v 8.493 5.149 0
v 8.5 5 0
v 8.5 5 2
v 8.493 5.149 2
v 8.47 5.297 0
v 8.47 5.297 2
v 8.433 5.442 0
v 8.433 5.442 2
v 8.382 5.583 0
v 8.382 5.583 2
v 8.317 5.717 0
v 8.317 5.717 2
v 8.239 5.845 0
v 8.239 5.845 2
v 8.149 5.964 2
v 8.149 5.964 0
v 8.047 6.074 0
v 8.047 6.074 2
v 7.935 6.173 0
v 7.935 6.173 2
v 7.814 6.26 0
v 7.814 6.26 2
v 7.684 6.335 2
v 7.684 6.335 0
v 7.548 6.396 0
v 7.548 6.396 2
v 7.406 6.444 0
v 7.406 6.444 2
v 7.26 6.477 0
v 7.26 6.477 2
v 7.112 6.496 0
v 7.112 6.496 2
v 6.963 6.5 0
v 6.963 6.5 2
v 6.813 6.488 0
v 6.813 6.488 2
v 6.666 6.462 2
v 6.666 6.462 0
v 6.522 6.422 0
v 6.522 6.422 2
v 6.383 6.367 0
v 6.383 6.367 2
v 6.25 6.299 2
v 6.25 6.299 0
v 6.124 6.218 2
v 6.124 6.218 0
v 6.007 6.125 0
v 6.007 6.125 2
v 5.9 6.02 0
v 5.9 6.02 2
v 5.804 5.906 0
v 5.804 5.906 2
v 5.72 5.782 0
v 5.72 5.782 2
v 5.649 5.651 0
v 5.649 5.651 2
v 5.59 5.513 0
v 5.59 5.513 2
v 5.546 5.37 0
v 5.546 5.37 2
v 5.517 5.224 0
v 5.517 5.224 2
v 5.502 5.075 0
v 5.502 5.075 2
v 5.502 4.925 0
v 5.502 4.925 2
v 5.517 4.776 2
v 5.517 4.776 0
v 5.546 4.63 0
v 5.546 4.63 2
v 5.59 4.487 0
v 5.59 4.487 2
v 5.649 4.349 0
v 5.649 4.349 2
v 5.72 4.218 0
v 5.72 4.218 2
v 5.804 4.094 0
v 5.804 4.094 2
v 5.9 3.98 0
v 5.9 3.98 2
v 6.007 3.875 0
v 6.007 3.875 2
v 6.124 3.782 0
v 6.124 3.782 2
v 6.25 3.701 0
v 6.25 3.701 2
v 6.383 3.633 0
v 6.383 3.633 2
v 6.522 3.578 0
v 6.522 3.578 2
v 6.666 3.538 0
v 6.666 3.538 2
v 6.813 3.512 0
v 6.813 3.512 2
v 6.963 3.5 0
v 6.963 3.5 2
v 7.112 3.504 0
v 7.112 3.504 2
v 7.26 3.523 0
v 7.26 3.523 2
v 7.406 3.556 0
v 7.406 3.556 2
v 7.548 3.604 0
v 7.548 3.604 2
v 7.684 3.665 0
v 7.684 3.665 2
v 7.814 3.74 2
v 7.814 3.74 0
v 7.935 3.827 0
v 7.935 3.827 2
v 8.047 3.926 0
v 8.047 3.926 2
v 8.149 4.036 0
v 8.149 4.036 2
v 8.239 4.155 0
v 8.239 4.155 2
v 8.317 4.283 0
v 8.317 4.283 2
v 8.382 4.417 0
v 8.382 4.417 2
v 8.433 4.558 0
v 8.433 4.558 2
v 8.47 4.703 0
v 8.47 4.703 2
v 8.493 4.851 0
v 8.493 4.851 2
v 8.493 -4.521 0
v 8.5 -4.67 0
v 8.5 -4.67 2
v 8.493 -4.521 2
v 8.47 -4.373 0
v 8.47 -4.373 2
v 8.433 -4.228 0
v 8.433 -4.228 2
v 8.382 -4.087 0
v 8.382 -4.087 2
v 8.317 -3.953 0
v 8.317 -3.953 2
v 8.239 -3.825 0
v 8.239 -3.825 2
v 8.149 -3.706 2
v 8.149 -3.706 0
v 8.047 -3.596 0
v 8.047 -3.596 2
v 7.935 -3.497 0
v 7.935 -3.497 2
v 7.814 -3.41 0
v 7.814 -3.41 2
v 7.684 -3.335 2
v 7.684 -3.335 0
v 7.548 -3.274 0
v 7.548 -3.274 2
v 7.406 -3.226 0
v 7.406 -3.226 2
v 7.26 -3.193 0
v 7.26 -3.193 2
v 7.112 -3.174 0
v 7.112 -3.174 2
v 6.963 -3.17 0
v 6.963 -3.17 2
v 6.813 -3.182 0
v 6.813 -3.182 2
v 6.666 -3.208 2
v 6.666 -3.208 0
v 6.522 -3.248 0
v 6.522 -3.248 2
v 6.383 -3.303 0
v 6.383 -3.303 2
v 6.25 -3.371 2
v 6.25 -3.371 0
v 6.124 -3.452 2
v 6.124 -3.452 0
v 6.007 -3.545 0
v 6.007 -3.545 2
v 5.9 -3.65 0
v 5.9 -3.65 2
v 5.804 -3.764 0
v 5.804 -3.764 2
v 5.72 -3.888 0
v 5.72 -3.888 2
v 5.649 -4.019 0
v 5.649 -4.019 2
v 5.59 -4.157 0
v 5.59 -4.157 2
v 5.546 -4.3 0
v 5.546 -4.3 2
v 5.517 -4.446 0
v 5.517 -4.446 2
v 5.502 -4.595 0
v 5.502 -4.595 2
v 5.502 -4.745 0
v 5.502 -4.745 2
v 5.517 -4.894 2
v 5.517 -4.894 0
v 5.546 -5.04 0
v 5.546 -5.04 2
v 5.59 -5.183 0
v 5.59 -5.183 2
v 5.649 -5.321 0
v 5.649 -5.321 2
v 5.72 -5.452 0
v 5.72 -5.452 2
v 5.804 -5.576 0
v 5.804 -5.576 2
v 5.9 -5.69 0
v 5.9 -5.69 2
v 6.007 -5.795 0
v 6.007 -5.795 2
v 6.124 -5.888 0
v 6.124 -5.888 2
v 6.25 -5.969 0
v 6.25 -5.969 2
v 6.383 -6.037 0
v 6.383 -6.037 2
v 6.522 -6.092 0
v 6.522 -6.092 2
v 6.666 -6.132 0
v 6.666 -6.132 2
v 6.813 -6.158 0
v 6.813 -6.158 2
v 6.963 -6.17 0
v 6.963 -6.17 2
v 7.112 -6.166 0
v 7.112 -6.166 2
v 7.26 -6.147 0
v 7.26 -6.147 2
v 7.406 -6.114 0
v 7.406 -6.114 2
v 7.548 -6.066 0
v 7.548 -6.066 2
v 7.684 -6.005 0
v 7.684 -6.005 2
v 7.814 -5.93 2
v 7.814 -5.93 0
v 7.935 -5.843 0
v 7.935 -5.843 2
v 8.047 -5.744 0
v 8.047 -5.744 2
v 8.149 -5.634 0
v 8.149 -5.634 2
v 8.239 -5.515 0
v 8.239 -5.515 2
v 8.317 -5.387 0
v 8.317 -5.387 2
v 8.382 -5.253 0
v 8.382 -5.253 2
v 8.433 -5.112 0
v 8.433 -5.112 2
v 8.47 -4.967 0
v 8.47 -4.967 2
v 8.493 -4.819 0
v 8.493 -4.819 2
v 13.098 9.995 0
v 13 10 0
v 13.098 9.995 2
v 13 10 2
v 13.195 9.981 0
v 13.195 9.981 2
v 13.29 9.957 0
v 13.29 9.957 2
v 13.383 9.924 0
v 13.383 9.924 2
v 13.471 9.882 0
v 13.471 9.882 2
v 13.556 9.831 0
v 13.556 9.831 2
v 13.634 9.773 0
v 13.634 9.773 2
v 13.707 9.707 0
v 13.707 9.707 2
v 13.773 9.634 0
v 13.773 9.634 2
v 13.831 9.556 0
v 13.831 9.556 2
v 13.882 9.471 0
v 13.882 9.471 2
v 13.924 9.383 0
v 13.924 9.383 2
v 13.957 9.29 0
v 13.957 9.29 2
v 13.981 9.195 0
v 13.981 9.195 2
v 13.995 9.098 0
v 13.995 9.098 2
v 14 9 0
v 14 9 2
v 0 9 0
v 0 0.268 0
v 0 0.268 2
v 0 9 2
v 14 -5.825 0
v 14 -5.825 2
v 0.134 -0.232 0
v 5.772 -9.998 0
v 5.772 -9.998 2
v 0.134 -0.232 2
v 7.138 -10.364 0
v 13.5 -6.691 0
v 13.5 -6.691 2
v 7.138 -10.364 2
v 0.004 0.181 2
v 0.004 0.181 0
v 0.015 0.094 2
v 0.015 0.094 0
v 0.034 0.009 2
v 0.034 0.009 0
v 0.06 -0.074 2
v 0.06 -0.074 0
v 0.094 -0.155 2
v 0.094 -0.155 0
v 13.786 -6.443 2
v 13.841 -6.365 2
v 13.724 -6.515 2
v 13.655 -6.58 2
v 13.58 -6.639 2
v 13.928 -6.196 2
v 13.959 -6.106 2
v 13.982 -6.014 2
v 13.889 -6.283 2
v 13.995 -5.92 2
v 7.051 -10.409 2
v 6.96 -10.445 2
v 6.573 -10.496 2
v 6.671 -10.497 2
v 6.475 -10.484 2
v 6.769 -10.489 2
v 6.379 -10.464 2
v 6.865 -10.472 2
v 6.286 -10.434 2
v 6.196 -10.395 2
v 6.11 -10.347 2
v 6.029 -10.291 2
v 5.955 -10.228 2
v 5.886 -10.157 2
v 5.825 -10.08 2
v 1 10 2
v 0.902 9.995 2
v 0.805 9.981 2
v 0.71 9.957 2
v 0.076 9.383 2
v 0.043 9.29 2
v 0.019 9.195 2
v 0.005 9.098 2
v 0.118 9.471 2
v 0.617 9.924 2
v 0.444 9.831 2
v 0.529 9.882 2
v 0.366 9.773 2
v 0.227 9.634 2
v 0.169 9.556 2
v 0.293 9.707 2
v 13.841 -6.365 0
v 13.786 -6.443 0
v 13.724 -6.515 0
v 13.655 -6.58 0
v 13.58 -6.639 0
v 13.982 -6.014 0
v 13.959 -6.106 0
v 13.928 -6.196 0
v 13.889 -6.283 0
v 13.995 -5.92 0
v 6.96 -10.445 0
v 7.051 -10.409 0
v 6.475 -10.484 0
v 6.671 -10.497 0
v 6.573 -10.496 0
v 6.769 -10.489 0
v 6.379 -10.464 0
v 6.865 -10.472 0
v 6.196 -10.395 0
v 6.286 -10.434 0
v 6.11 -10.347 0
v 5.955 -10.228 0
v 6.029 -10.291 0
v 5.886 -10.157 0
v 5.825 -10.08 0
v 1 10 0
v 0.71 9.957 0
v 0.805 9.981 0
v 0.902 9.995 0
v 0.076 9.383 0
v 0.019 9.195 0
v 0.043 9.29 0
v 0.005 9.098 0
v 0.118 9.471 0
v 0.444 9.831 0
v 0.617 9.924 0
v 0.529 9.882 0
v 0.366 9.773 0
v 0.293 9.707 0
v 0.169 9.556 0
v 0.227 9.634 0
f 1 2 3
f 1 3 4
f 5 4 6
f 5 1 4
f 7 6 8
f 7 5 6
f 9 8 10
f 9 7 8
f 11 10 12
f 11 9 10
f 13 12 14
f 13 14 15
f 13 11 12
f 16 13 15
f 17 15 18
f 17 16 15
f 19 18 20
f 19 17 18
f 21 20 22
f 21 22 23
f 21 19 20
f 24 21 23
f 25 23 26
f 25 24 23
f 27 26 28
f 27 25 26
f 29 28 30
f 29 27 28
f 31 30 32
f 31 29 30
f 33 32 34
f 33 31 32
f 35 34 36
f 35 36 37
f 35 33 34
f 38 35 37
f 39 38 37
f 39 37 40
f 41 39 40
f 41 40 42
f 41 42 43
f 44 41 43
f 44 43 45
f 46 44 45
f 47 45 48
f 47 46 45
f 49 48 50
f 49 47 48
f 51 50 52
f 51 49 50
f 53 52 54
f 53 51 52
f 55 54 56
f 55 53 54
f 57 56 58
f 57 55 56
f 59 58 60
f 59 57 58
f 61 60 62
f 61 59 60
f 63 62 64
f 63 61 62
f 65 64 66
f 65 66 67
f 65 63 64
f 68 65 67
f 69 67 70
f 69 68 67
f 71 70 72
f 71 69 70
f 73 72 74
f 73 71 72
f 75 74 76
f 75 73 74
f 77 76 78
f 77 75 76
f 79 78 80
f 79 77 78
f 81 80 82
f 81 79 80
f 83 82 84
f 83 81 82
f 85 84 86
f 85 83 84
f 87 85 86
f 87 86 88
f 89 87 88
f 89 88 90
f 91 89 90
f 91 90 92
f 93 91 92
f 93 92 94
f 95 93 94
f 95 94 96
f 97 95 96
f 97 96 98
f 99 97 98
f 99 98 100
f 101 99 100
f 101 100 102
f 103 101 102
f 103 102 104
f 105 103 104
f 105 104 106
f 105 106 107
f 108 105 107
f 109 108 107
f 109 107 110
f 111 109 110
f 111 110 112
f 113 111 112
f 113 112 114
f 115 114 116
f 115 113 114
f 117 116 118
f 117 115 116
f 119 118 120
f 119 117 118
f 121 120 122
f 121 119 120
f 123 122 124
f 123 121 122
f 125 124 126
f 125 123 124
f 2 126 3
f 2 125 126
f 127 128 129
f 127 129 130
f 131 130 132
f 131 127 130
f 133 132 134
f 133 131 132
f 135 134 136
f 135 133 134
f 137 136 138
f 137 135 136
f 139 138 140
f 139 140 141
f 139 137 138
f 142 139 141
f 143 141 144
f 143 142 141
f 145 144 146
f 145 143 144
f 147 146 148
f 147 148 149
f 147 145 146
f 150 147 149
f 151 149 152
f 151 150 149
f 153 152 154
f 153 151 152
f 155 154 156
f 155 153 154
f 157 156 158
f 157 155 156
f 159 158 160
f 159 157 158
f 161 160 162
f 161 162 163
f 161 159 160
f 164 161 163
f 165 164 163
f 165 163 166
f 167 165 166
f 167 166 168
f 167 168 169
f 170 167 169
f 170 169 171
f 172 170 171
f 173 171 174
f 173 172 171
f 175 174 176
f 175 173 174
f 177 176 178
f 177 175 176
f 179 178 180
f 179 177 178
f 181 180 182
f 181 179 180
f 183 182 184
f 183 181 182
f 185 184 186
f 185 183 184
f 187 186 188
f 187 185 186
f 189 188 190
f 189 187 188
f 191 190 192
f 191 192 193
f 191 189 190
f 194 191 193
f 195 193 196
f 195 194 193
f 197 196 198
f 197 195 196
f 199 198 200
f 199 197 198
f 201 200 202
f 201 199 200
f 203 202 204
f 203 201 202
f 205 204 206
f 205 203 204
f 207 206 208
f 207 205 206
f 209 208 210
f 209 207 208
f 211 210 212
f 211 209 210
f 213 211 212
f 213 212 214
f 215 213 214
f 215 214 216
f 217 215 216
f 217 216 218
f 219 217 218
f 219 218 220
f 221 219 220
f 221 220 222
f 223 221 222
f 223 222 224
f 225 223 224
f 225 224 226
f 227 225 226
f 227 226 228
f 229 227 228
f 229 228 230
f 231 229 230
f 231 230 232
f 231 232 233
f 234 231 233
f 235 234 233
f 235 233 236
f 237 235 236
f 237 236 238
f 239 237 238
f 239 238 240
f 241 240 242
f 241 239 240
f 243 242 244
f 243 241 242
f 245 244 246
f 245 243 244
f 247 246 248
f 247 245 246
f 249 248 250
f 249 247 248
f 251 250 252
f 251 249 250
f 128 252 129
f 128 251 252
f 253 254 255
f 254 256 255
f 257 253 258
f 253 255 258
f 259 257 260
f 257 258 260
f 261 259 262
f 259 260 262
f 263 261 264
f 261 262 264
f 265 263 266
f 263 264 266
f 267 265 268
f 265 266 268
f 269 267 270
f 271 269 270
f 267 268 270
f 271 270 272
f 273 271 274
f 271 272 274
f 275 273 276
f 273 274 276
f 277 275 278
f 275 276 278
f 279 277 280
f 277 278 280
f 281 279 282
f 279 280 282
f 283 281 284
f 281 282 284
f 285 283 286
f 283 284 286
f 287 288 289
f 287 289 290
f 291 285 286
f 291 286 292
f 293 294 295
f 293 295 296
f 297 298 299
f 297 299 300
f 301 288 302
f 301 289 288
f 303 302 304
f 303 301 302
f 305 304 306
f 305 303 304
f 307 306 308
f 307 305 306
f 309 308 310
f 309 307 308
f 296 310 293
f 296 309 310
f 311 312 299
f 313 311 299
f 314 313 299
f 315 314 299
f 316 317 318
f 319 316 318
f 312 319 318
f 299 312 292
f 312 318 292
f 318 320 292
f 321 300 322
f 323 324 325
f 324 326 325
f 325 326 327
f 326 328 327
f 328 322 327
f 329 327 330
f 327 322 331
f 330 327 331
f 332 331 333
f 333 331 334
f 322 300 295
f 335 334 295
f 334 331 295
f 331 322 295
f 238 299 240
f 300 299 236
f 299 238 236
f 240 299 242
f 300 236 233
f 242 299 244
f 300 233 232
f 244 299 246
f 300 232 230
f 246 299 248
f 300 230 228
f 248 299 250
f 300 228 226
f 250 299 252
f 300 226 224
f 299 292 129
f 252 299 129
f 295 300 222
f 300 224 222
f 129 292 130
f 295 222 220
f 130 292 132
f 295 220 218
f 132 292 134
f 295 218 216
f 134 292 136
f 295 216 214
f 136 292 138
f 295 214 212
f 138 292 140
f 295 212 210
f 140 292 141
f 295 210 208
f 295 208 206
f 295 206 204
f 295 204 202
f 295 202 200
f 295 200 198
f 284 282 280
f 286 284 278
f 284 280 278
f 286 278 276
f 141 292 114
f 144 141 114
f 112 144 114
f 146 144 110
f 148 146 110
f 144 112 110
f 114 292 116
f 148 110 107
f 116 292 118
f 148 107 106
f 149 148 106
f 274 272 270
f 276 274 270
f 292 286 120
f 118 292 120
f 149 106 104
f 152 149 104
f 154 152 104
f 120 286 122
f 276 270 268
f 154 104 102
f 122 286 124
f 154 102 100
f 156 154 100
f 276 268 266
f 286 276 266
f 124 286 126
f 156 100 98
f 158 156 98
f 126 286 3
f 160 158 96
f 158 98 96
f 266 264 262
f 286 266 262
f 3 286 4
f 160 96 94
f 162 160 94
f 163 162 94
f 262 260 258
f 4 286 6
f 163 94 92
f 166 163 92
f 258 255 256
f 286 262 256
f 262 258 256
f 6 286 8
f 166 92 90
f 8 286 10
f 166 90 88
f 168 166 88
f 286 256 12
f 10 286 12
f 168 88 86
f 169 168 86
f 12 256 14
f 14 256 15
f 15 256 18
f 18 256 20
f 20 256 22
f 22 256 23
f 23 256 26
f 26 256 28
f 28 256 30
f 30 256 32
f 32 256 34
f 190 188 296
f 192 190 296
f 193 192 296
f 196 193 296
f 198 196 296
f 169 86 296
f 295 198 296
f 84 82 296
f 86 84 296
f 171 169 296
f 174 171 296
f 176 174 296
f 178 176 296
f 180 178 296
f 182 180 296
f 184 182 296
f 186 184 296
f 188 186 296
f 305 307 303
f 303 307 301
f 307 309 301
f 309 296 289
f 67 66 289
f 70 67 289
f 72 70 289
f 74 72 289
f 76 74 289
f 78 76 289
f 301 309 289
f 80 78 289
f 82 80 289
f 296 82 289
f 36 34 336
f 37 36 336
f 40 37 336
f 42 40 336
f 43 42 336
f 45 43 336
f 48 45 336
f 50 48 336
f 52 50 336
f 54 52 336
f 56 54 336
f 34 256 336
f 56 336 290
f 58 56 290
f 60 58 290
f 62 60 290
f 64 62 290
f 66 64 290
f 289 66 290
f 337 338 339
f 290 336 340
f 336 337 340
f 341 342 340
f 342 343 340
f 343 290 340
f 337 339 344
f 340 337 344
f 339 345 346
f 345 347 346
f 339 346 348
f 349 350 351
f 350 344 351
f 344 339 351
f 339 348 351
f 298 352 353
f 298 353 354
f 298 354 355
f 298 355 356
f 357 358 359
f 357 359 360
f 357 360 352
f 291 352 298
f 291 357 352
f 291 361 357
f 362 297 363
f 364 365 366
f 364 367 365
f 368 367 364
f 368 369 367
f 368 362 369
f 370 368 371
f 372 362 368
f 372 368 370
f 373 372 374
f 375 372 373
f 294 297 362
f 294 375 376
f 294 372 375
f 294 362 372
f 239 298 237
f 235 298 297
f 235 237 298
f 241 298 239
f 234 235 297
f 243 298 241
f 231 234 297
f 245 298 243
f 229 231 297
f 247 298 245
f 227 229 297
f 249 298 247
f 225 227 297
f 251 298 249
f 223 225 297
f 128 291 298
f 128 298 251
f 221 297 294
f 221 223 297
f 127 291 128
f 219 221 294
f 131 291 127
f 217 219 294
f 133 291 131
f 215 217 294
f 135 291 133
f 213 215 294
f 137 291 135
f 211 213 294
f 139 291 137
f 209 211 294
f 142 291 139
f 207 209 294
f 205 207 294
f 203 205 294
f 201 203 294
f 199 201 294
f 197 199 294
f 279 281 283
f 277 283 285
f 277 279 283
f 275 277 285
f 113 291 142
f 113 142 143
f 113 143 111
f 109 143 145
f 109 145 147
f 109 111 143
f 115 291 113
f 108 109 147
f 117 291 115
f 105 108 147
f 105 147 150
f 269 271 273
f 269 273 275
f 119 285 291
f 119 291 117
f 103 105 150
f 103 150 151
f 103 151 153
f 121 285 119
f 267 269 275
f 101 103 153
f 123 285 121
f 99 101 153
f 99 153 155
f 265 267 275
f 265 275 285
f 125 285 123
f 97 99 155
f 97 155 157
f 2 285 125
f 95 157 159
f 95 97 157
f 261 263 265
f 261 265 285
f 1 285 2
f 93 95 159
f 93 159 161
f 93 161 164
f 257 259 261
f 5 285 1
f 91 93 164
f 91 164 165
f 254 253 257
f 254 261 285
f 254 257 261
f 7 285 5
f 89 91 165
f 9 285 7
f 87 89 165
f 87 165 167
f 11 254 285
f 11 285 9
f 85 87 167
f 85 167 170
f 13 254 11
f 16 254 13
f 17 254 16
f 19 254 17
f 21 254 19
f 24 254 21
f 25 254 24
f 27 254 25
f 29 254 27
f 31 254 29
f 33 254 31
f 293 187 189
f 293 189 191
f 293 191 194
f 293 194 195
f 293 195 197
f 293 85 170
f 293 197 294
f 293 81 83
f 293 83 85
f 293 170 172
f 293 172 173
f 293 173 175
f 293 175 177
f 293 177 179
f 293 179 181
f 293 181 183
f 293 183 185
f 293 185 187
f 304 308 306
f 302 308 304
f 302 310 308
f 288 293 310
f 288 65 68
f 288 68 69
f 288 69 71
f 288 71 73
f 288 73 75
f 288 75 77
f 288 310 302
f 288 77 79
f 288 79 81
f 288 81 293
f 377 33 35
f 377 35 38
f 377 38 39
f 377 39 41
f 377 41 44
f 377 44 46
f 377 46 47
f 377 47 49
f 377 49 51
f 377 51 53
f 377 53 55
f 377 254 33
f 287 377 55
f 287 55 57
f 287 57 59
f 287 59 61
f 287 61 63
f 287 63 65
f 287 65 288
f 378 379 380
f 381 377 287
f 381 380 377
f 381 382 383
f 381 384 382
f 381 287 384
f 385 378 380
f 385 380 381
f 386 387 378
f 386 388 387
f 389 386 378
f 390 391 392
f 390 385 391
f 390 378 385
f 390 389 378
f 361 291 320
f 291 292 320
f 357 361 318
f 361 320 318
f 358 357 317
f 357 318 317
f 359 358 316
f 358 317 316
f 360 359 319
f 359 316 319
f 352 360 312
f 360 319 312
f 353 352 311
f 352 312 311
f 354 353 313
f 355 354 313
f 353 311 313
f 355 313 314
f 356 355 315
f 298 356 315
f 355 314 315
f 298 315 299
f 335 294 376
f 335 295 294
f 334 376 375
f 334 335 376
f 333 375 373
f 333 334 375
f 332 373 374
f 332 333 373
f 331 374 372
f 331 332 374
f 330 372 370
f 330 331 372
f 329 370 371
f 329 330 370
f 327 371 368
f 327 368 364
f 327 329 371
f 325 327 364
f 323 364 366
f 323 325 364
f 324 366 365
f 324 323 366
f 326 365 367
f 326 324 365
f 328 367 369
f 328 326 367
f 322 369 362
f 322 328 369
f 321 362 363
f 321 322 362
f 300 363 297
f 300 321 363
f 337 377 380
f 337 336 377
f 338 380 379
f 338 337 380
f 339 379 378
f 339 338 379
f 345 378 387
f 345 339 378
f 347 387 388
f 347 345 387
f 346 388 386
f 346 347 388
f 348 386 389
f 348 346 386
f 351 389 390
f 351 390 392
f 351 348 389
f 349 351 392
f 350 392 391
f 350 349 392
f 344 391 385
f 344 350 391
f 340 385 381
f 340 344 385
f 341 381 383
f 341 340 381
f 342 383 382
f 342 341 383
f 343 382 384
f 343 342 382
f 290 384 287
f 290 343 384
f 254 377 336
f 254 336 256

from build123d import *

# Parameters (mm, degrees)
SKETCH_1_R      = 1.5
EXTRUDE_1_DEPTH = 2
FILLET_1_R      = 1


with BuildPart() as part:
    # 草图1 → 凸台-拉伸1 (new body)
    with BuildSketch(Plane.XY):
        Polygon((0, 10), (14, 10), (14, -6.402050808), (6.272169318, -10.863715932), (0, 0), align=None)
        with Locations((7, 5)):
            Circle(SKETCH_1_R, mode=Mode.SUBTRACT)
        with Locations((7, -4.67)):
            Circle(SKETCH_1_R, mode=Mode.SUBTRACT)
    extrude(amount=EXTRUDE_1_DEPTH)

    # 圆角1
    fillet_1_edges = [part.edges().sort_by_distance(p)[0] for p in [
        (0, 10, 1),
        (14, 10, 1),
        (14, -6.402050808, 1),
        (6.272169318, -10.863715932, 1),
        (0, 0, 1),
    ]]
    fillet(fillet_1_edges, radius=FILLET_1_R)


solid = part.part
